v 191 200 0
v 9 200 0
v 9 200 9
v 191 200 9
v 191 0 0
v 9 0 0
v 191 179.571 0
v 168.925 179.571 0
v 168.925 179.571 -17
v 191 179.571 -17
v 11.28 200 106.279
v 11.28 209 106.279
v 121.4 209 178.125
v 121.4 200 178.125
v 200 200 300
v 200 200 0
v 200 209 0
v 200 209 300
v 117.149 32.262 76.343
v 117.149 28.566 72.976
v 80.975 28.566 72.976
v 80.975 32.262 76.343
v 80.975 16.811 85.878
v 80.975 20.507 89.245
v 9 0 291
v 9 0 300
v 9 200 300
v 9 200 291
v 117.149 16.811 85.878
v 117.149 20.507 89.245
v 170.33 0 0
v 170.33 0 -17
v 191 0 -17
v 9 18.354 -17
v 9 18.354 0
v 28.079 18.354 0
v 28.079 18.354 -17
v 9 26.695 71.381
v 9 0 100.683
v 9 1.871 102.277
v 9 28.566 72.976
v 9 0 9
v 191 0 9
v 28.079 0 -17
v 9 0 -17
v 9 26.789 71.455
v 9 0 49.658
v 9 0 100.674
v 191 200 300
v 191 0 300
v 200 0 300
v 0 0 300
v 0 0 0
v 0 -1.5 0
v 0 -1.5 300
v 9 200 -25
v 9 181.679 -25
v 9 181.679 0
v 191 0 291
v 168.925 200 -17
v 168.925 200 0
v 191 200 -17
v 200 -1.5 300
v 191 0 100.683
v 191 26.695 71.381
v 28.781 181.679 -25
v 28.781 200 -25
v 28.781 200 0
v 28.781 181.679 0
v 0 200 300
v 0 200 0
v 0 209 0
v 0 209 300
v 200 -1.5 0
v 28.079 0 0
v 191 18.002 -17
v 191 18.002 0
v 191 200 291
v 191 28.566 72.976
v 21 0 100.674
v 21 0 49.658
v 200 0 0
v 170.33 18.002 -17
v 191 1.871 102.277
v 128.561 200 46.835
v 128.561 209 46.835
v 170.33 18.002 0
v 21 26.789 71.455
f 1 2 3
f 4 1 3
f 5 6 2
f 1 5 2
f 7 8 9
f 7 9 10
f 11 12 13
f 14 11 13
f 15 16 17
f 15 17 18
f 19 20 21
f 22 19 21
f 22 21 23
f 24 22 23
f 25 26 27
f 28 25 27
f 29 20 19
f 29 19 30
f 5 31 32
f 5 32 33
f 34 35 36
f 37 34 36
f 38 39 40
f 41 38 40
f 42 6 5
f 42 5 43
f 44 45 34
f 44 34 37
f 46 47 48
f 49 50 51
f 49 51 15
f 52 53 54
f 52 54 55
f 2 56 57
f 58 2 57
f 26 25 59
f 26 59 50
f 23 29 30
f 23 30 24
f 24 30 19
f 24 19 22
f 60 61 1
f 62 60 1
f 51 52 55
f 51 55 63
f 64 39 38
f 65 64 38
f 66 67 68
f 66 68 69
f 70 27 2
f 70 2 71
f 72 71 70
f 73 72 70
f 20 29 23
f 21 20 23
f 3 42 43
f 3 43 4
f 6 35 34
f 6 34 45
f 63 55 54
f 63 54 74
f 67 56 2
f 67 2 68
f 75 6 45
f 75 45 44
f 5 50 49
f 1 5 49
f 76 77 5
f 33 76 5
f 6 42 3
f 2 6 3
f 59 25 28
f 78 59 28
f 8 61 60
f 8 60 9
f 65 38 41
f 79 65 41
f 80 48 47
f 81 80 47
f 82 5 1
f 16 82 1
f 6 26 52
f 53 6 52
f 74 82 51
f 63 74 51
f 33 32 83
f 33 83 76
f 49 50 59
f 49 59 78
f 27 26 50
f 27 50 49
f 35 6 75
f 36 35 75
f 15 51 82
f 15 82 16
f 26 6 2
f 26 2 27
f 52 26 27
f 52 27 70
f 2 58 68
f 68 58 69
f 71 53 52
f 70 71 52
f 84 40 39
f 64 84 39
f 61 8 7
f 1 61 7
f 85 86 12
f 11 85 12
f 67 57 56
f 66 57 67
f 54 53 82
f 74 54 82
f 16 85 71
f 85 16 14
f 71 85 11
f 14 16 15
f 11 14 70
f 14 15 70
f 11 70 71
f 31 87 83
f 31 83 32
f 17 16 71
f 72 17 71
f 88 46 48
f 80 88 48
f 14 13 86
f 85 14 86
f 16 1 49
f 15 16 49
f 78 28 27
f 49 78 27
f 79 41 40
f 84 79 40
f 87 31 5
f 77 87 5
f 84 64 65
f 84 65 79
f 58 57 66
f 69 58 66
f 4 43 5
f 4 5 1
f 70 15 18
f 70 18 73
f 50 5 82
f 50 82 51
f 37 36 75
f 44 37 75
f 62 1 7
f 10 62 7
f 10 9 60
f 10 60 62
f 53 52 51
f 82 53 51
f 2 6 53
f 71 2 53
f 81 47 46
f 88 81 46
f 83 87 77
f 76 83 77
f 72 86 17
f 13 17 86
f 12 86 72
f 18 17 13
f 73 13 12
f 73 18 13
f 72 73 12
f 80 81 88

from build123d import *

# Parameters (mm, degrees)
F0_W      = 200
F0_H      = 300
F1_DEPTH  = 1.5
F2_W      = 9
F2_H      = 300
F3_DEPTH  = 200
F5_DEPTH  = 12
F7_DEPTH  = 182
F8_W      = 36.1736565828
F8_H      = 17.4541914756
F9_DEPTH  = 5
F10_W     = 200
F10_H     = 9
F11_DEPTH = 182
F12_W     = 200
F12_H     = 9
F13_DEPTH = 182
F14_W     = 200
F14_H     = 300
F15_DEPTH = 9
F16_W     = 200
F16_H     = 300
F17_DEPTH = 9
F19_DEPTH = 9
F20_W     = 19.0787982047
F20_H     = 18.353709951
F21_DEPTH = 17
F22_W     = 20.6703100204
F22_H     = 18.0024765432
F23_DEPTH = 17
F24_W     = 19.7812706083
F24_H     = 18.321198225
F25_DEPTH = 25
F26_W     = 22.0752660036
F26_H     = 20.428609848
F27_DEPTH = 17


with BuildPart() as f1:
    # F0 (on Front) → F1 (new body)
    with BuildSketch(Plane.XZ):
        with Locations((100, 150)):
            Rectangle(F0_W, F0_H)
    extrude(amount=F1_DEPTH)


with BuildPart() as f3:
    # F2 (on face) → F3 (new body)
    with BuildSketch(Plane(origin=(0, 0, 0), x_dir=(-1, 0, 0), z_dir=(0, 1, 0))):
        with Locations((-4.5, 150)):
            Rectangle(F2_W, F2_H)
    extrude(amount=F3_DEPTH)


with BuildPart() as f5:
    # F4 (on face) → F5 (new body)
    with BuildSketch(Plane.YZ.offset(9)):
        Polygon((26.78886801, 71.4553892612), (0, 100.6735935807), (0, 49.6576875448), align=None)
    extrude(amount=F5_DEPTH)


with BuildPart() as f7:
    # F6 (on face) → F7 (new body)
    with BuildSketch(Plane.YZ.offset(9)):
        Polygon((0, 100.6827801466), (26.6951930206, 71.3809460833), (28.5659389403, 72.9755168813), (1.8707459197, 102.2773509446), align=None)
    extrude(amount=F7_DEPTH)


with BuildPart() as f9:
    # F8 (on face) → F9 (new body)
    with BuildSketch(Plane(origin=(0, 51.9398003156, 47.3193245133), x_dir=(-1, 0, 0), z_dir=(0, 0.7392218773, 0.6734619634))):
        with Locations((-99.0622192621, 43.434120998)):
            Rectangle(F8_W, F8_H)
    extrude(amount=F9_DEPTH)


with BuildPart() as f11:
    # F10 (on face) → F11 (new body)
    with BuildSketch(Plane.YZ.offset(9)):
        with Locations((100, 295.5)):
            Rectangle(F10_W, F10_H)
    extrude(amount=F11_DEPTH)


with BuildPart() as f13:
    # F12 (on face) → F13 (new body)
    with BuildSketch(Plane.YZ.offset(9)):
        with Locations((100, 4.5)):
            Rectangle(F12_W, F12_H)
    extrude(amount=F13_DEPTH)


with BuildPart() as f15:
    # F14 (on face) → F15 (new body)
    with BuildSketch(Plane.YZ.offset(191)):
        with Locations((100, 150)):
            Rectangle(F14_W, F14_H)
    extrude(amount=F15_DEPTH)


with BuildPart() as f17:
    # F16 (on face) → F17 (new body)
    with BuildSketch(Plane(origin=(0, 200, 0), x_dir=(-1, 0, 0), z_dir=(0, 1, 0))):
        with Locations((-100, 150)):
            Rectangle(F16_W, F16_H)
    extrude(amount=F17_DEPTH)

    # F18 (on face) → F19 (cut)
    with BuildSketch(Plane(origin=(0, 209, 0), x_dir=(-1, 0, 0), z_dir=(0, 1, 0))):
        Polygon((-128.5608279519, 46.835172161), (-11.280162353, 106.2787890588), (-121.4001774788, 178.1250163913), align=None)
    extrude(amount=-F19_DEPTH, mode=Mode.SUBTRACT)


with BuildPart() as f21:
    # F20 (on face) → F21 (new body)
    with BuildSketch(Plane(origin=(0, 0, 0), x_dir=(1, 0, 0), z_dir=(0, 0, -1))):
        with Locations((18.5393991023, -9.1768549755)):
            Rectangle(F20_W, F20_H)
    extrude(amount=F21_DEPTH)


with BuildPart() as f23:
    # F22 (on face) → F23 (new body)
    with BuildSketch(Plane(origin=(0, 0, 0), x_dir=(1, 0, 0), z_dir=(0, 0, -1))):
        with Locations((180.6648449898, -9.0012382716)):
            Rectangle(F22_W, F22_H)
    extrude(amount=F23_DEPTH)


with BuildPart() as f25:
    # F24 (on face) → F25 (new body)
    with BuildSketch(Plane(origin=(0, 0, 0), x_dir=(1, 0, 0), z_dir=(0, 0, -1))):
        with Locations((18.8906353042, -190.8394008875)):
            Rectangle(F24_W, F24_H)
    extrude(amount=F25_DEPTH)


with BuildPart() as f27:
    # F26 (on face) → F27 (new body)
    with BuildSketch(Plane(origin=(0, 0, 0), x_dir=(1, 0, 0), z_dir=(0, 0, -1))):
        with Locations((179.9623669982, -189.785695076)):
            Rectangle(F26_W, F26_H)
    extrude(amount=F27_DEPTH)


solid = Compound([f1.part, f3.part, f5.part, f7.part, f9.part, f11.part, f13.part, f15.part, f17.part, f21.part, f23.part, f25.part, f27.part])
